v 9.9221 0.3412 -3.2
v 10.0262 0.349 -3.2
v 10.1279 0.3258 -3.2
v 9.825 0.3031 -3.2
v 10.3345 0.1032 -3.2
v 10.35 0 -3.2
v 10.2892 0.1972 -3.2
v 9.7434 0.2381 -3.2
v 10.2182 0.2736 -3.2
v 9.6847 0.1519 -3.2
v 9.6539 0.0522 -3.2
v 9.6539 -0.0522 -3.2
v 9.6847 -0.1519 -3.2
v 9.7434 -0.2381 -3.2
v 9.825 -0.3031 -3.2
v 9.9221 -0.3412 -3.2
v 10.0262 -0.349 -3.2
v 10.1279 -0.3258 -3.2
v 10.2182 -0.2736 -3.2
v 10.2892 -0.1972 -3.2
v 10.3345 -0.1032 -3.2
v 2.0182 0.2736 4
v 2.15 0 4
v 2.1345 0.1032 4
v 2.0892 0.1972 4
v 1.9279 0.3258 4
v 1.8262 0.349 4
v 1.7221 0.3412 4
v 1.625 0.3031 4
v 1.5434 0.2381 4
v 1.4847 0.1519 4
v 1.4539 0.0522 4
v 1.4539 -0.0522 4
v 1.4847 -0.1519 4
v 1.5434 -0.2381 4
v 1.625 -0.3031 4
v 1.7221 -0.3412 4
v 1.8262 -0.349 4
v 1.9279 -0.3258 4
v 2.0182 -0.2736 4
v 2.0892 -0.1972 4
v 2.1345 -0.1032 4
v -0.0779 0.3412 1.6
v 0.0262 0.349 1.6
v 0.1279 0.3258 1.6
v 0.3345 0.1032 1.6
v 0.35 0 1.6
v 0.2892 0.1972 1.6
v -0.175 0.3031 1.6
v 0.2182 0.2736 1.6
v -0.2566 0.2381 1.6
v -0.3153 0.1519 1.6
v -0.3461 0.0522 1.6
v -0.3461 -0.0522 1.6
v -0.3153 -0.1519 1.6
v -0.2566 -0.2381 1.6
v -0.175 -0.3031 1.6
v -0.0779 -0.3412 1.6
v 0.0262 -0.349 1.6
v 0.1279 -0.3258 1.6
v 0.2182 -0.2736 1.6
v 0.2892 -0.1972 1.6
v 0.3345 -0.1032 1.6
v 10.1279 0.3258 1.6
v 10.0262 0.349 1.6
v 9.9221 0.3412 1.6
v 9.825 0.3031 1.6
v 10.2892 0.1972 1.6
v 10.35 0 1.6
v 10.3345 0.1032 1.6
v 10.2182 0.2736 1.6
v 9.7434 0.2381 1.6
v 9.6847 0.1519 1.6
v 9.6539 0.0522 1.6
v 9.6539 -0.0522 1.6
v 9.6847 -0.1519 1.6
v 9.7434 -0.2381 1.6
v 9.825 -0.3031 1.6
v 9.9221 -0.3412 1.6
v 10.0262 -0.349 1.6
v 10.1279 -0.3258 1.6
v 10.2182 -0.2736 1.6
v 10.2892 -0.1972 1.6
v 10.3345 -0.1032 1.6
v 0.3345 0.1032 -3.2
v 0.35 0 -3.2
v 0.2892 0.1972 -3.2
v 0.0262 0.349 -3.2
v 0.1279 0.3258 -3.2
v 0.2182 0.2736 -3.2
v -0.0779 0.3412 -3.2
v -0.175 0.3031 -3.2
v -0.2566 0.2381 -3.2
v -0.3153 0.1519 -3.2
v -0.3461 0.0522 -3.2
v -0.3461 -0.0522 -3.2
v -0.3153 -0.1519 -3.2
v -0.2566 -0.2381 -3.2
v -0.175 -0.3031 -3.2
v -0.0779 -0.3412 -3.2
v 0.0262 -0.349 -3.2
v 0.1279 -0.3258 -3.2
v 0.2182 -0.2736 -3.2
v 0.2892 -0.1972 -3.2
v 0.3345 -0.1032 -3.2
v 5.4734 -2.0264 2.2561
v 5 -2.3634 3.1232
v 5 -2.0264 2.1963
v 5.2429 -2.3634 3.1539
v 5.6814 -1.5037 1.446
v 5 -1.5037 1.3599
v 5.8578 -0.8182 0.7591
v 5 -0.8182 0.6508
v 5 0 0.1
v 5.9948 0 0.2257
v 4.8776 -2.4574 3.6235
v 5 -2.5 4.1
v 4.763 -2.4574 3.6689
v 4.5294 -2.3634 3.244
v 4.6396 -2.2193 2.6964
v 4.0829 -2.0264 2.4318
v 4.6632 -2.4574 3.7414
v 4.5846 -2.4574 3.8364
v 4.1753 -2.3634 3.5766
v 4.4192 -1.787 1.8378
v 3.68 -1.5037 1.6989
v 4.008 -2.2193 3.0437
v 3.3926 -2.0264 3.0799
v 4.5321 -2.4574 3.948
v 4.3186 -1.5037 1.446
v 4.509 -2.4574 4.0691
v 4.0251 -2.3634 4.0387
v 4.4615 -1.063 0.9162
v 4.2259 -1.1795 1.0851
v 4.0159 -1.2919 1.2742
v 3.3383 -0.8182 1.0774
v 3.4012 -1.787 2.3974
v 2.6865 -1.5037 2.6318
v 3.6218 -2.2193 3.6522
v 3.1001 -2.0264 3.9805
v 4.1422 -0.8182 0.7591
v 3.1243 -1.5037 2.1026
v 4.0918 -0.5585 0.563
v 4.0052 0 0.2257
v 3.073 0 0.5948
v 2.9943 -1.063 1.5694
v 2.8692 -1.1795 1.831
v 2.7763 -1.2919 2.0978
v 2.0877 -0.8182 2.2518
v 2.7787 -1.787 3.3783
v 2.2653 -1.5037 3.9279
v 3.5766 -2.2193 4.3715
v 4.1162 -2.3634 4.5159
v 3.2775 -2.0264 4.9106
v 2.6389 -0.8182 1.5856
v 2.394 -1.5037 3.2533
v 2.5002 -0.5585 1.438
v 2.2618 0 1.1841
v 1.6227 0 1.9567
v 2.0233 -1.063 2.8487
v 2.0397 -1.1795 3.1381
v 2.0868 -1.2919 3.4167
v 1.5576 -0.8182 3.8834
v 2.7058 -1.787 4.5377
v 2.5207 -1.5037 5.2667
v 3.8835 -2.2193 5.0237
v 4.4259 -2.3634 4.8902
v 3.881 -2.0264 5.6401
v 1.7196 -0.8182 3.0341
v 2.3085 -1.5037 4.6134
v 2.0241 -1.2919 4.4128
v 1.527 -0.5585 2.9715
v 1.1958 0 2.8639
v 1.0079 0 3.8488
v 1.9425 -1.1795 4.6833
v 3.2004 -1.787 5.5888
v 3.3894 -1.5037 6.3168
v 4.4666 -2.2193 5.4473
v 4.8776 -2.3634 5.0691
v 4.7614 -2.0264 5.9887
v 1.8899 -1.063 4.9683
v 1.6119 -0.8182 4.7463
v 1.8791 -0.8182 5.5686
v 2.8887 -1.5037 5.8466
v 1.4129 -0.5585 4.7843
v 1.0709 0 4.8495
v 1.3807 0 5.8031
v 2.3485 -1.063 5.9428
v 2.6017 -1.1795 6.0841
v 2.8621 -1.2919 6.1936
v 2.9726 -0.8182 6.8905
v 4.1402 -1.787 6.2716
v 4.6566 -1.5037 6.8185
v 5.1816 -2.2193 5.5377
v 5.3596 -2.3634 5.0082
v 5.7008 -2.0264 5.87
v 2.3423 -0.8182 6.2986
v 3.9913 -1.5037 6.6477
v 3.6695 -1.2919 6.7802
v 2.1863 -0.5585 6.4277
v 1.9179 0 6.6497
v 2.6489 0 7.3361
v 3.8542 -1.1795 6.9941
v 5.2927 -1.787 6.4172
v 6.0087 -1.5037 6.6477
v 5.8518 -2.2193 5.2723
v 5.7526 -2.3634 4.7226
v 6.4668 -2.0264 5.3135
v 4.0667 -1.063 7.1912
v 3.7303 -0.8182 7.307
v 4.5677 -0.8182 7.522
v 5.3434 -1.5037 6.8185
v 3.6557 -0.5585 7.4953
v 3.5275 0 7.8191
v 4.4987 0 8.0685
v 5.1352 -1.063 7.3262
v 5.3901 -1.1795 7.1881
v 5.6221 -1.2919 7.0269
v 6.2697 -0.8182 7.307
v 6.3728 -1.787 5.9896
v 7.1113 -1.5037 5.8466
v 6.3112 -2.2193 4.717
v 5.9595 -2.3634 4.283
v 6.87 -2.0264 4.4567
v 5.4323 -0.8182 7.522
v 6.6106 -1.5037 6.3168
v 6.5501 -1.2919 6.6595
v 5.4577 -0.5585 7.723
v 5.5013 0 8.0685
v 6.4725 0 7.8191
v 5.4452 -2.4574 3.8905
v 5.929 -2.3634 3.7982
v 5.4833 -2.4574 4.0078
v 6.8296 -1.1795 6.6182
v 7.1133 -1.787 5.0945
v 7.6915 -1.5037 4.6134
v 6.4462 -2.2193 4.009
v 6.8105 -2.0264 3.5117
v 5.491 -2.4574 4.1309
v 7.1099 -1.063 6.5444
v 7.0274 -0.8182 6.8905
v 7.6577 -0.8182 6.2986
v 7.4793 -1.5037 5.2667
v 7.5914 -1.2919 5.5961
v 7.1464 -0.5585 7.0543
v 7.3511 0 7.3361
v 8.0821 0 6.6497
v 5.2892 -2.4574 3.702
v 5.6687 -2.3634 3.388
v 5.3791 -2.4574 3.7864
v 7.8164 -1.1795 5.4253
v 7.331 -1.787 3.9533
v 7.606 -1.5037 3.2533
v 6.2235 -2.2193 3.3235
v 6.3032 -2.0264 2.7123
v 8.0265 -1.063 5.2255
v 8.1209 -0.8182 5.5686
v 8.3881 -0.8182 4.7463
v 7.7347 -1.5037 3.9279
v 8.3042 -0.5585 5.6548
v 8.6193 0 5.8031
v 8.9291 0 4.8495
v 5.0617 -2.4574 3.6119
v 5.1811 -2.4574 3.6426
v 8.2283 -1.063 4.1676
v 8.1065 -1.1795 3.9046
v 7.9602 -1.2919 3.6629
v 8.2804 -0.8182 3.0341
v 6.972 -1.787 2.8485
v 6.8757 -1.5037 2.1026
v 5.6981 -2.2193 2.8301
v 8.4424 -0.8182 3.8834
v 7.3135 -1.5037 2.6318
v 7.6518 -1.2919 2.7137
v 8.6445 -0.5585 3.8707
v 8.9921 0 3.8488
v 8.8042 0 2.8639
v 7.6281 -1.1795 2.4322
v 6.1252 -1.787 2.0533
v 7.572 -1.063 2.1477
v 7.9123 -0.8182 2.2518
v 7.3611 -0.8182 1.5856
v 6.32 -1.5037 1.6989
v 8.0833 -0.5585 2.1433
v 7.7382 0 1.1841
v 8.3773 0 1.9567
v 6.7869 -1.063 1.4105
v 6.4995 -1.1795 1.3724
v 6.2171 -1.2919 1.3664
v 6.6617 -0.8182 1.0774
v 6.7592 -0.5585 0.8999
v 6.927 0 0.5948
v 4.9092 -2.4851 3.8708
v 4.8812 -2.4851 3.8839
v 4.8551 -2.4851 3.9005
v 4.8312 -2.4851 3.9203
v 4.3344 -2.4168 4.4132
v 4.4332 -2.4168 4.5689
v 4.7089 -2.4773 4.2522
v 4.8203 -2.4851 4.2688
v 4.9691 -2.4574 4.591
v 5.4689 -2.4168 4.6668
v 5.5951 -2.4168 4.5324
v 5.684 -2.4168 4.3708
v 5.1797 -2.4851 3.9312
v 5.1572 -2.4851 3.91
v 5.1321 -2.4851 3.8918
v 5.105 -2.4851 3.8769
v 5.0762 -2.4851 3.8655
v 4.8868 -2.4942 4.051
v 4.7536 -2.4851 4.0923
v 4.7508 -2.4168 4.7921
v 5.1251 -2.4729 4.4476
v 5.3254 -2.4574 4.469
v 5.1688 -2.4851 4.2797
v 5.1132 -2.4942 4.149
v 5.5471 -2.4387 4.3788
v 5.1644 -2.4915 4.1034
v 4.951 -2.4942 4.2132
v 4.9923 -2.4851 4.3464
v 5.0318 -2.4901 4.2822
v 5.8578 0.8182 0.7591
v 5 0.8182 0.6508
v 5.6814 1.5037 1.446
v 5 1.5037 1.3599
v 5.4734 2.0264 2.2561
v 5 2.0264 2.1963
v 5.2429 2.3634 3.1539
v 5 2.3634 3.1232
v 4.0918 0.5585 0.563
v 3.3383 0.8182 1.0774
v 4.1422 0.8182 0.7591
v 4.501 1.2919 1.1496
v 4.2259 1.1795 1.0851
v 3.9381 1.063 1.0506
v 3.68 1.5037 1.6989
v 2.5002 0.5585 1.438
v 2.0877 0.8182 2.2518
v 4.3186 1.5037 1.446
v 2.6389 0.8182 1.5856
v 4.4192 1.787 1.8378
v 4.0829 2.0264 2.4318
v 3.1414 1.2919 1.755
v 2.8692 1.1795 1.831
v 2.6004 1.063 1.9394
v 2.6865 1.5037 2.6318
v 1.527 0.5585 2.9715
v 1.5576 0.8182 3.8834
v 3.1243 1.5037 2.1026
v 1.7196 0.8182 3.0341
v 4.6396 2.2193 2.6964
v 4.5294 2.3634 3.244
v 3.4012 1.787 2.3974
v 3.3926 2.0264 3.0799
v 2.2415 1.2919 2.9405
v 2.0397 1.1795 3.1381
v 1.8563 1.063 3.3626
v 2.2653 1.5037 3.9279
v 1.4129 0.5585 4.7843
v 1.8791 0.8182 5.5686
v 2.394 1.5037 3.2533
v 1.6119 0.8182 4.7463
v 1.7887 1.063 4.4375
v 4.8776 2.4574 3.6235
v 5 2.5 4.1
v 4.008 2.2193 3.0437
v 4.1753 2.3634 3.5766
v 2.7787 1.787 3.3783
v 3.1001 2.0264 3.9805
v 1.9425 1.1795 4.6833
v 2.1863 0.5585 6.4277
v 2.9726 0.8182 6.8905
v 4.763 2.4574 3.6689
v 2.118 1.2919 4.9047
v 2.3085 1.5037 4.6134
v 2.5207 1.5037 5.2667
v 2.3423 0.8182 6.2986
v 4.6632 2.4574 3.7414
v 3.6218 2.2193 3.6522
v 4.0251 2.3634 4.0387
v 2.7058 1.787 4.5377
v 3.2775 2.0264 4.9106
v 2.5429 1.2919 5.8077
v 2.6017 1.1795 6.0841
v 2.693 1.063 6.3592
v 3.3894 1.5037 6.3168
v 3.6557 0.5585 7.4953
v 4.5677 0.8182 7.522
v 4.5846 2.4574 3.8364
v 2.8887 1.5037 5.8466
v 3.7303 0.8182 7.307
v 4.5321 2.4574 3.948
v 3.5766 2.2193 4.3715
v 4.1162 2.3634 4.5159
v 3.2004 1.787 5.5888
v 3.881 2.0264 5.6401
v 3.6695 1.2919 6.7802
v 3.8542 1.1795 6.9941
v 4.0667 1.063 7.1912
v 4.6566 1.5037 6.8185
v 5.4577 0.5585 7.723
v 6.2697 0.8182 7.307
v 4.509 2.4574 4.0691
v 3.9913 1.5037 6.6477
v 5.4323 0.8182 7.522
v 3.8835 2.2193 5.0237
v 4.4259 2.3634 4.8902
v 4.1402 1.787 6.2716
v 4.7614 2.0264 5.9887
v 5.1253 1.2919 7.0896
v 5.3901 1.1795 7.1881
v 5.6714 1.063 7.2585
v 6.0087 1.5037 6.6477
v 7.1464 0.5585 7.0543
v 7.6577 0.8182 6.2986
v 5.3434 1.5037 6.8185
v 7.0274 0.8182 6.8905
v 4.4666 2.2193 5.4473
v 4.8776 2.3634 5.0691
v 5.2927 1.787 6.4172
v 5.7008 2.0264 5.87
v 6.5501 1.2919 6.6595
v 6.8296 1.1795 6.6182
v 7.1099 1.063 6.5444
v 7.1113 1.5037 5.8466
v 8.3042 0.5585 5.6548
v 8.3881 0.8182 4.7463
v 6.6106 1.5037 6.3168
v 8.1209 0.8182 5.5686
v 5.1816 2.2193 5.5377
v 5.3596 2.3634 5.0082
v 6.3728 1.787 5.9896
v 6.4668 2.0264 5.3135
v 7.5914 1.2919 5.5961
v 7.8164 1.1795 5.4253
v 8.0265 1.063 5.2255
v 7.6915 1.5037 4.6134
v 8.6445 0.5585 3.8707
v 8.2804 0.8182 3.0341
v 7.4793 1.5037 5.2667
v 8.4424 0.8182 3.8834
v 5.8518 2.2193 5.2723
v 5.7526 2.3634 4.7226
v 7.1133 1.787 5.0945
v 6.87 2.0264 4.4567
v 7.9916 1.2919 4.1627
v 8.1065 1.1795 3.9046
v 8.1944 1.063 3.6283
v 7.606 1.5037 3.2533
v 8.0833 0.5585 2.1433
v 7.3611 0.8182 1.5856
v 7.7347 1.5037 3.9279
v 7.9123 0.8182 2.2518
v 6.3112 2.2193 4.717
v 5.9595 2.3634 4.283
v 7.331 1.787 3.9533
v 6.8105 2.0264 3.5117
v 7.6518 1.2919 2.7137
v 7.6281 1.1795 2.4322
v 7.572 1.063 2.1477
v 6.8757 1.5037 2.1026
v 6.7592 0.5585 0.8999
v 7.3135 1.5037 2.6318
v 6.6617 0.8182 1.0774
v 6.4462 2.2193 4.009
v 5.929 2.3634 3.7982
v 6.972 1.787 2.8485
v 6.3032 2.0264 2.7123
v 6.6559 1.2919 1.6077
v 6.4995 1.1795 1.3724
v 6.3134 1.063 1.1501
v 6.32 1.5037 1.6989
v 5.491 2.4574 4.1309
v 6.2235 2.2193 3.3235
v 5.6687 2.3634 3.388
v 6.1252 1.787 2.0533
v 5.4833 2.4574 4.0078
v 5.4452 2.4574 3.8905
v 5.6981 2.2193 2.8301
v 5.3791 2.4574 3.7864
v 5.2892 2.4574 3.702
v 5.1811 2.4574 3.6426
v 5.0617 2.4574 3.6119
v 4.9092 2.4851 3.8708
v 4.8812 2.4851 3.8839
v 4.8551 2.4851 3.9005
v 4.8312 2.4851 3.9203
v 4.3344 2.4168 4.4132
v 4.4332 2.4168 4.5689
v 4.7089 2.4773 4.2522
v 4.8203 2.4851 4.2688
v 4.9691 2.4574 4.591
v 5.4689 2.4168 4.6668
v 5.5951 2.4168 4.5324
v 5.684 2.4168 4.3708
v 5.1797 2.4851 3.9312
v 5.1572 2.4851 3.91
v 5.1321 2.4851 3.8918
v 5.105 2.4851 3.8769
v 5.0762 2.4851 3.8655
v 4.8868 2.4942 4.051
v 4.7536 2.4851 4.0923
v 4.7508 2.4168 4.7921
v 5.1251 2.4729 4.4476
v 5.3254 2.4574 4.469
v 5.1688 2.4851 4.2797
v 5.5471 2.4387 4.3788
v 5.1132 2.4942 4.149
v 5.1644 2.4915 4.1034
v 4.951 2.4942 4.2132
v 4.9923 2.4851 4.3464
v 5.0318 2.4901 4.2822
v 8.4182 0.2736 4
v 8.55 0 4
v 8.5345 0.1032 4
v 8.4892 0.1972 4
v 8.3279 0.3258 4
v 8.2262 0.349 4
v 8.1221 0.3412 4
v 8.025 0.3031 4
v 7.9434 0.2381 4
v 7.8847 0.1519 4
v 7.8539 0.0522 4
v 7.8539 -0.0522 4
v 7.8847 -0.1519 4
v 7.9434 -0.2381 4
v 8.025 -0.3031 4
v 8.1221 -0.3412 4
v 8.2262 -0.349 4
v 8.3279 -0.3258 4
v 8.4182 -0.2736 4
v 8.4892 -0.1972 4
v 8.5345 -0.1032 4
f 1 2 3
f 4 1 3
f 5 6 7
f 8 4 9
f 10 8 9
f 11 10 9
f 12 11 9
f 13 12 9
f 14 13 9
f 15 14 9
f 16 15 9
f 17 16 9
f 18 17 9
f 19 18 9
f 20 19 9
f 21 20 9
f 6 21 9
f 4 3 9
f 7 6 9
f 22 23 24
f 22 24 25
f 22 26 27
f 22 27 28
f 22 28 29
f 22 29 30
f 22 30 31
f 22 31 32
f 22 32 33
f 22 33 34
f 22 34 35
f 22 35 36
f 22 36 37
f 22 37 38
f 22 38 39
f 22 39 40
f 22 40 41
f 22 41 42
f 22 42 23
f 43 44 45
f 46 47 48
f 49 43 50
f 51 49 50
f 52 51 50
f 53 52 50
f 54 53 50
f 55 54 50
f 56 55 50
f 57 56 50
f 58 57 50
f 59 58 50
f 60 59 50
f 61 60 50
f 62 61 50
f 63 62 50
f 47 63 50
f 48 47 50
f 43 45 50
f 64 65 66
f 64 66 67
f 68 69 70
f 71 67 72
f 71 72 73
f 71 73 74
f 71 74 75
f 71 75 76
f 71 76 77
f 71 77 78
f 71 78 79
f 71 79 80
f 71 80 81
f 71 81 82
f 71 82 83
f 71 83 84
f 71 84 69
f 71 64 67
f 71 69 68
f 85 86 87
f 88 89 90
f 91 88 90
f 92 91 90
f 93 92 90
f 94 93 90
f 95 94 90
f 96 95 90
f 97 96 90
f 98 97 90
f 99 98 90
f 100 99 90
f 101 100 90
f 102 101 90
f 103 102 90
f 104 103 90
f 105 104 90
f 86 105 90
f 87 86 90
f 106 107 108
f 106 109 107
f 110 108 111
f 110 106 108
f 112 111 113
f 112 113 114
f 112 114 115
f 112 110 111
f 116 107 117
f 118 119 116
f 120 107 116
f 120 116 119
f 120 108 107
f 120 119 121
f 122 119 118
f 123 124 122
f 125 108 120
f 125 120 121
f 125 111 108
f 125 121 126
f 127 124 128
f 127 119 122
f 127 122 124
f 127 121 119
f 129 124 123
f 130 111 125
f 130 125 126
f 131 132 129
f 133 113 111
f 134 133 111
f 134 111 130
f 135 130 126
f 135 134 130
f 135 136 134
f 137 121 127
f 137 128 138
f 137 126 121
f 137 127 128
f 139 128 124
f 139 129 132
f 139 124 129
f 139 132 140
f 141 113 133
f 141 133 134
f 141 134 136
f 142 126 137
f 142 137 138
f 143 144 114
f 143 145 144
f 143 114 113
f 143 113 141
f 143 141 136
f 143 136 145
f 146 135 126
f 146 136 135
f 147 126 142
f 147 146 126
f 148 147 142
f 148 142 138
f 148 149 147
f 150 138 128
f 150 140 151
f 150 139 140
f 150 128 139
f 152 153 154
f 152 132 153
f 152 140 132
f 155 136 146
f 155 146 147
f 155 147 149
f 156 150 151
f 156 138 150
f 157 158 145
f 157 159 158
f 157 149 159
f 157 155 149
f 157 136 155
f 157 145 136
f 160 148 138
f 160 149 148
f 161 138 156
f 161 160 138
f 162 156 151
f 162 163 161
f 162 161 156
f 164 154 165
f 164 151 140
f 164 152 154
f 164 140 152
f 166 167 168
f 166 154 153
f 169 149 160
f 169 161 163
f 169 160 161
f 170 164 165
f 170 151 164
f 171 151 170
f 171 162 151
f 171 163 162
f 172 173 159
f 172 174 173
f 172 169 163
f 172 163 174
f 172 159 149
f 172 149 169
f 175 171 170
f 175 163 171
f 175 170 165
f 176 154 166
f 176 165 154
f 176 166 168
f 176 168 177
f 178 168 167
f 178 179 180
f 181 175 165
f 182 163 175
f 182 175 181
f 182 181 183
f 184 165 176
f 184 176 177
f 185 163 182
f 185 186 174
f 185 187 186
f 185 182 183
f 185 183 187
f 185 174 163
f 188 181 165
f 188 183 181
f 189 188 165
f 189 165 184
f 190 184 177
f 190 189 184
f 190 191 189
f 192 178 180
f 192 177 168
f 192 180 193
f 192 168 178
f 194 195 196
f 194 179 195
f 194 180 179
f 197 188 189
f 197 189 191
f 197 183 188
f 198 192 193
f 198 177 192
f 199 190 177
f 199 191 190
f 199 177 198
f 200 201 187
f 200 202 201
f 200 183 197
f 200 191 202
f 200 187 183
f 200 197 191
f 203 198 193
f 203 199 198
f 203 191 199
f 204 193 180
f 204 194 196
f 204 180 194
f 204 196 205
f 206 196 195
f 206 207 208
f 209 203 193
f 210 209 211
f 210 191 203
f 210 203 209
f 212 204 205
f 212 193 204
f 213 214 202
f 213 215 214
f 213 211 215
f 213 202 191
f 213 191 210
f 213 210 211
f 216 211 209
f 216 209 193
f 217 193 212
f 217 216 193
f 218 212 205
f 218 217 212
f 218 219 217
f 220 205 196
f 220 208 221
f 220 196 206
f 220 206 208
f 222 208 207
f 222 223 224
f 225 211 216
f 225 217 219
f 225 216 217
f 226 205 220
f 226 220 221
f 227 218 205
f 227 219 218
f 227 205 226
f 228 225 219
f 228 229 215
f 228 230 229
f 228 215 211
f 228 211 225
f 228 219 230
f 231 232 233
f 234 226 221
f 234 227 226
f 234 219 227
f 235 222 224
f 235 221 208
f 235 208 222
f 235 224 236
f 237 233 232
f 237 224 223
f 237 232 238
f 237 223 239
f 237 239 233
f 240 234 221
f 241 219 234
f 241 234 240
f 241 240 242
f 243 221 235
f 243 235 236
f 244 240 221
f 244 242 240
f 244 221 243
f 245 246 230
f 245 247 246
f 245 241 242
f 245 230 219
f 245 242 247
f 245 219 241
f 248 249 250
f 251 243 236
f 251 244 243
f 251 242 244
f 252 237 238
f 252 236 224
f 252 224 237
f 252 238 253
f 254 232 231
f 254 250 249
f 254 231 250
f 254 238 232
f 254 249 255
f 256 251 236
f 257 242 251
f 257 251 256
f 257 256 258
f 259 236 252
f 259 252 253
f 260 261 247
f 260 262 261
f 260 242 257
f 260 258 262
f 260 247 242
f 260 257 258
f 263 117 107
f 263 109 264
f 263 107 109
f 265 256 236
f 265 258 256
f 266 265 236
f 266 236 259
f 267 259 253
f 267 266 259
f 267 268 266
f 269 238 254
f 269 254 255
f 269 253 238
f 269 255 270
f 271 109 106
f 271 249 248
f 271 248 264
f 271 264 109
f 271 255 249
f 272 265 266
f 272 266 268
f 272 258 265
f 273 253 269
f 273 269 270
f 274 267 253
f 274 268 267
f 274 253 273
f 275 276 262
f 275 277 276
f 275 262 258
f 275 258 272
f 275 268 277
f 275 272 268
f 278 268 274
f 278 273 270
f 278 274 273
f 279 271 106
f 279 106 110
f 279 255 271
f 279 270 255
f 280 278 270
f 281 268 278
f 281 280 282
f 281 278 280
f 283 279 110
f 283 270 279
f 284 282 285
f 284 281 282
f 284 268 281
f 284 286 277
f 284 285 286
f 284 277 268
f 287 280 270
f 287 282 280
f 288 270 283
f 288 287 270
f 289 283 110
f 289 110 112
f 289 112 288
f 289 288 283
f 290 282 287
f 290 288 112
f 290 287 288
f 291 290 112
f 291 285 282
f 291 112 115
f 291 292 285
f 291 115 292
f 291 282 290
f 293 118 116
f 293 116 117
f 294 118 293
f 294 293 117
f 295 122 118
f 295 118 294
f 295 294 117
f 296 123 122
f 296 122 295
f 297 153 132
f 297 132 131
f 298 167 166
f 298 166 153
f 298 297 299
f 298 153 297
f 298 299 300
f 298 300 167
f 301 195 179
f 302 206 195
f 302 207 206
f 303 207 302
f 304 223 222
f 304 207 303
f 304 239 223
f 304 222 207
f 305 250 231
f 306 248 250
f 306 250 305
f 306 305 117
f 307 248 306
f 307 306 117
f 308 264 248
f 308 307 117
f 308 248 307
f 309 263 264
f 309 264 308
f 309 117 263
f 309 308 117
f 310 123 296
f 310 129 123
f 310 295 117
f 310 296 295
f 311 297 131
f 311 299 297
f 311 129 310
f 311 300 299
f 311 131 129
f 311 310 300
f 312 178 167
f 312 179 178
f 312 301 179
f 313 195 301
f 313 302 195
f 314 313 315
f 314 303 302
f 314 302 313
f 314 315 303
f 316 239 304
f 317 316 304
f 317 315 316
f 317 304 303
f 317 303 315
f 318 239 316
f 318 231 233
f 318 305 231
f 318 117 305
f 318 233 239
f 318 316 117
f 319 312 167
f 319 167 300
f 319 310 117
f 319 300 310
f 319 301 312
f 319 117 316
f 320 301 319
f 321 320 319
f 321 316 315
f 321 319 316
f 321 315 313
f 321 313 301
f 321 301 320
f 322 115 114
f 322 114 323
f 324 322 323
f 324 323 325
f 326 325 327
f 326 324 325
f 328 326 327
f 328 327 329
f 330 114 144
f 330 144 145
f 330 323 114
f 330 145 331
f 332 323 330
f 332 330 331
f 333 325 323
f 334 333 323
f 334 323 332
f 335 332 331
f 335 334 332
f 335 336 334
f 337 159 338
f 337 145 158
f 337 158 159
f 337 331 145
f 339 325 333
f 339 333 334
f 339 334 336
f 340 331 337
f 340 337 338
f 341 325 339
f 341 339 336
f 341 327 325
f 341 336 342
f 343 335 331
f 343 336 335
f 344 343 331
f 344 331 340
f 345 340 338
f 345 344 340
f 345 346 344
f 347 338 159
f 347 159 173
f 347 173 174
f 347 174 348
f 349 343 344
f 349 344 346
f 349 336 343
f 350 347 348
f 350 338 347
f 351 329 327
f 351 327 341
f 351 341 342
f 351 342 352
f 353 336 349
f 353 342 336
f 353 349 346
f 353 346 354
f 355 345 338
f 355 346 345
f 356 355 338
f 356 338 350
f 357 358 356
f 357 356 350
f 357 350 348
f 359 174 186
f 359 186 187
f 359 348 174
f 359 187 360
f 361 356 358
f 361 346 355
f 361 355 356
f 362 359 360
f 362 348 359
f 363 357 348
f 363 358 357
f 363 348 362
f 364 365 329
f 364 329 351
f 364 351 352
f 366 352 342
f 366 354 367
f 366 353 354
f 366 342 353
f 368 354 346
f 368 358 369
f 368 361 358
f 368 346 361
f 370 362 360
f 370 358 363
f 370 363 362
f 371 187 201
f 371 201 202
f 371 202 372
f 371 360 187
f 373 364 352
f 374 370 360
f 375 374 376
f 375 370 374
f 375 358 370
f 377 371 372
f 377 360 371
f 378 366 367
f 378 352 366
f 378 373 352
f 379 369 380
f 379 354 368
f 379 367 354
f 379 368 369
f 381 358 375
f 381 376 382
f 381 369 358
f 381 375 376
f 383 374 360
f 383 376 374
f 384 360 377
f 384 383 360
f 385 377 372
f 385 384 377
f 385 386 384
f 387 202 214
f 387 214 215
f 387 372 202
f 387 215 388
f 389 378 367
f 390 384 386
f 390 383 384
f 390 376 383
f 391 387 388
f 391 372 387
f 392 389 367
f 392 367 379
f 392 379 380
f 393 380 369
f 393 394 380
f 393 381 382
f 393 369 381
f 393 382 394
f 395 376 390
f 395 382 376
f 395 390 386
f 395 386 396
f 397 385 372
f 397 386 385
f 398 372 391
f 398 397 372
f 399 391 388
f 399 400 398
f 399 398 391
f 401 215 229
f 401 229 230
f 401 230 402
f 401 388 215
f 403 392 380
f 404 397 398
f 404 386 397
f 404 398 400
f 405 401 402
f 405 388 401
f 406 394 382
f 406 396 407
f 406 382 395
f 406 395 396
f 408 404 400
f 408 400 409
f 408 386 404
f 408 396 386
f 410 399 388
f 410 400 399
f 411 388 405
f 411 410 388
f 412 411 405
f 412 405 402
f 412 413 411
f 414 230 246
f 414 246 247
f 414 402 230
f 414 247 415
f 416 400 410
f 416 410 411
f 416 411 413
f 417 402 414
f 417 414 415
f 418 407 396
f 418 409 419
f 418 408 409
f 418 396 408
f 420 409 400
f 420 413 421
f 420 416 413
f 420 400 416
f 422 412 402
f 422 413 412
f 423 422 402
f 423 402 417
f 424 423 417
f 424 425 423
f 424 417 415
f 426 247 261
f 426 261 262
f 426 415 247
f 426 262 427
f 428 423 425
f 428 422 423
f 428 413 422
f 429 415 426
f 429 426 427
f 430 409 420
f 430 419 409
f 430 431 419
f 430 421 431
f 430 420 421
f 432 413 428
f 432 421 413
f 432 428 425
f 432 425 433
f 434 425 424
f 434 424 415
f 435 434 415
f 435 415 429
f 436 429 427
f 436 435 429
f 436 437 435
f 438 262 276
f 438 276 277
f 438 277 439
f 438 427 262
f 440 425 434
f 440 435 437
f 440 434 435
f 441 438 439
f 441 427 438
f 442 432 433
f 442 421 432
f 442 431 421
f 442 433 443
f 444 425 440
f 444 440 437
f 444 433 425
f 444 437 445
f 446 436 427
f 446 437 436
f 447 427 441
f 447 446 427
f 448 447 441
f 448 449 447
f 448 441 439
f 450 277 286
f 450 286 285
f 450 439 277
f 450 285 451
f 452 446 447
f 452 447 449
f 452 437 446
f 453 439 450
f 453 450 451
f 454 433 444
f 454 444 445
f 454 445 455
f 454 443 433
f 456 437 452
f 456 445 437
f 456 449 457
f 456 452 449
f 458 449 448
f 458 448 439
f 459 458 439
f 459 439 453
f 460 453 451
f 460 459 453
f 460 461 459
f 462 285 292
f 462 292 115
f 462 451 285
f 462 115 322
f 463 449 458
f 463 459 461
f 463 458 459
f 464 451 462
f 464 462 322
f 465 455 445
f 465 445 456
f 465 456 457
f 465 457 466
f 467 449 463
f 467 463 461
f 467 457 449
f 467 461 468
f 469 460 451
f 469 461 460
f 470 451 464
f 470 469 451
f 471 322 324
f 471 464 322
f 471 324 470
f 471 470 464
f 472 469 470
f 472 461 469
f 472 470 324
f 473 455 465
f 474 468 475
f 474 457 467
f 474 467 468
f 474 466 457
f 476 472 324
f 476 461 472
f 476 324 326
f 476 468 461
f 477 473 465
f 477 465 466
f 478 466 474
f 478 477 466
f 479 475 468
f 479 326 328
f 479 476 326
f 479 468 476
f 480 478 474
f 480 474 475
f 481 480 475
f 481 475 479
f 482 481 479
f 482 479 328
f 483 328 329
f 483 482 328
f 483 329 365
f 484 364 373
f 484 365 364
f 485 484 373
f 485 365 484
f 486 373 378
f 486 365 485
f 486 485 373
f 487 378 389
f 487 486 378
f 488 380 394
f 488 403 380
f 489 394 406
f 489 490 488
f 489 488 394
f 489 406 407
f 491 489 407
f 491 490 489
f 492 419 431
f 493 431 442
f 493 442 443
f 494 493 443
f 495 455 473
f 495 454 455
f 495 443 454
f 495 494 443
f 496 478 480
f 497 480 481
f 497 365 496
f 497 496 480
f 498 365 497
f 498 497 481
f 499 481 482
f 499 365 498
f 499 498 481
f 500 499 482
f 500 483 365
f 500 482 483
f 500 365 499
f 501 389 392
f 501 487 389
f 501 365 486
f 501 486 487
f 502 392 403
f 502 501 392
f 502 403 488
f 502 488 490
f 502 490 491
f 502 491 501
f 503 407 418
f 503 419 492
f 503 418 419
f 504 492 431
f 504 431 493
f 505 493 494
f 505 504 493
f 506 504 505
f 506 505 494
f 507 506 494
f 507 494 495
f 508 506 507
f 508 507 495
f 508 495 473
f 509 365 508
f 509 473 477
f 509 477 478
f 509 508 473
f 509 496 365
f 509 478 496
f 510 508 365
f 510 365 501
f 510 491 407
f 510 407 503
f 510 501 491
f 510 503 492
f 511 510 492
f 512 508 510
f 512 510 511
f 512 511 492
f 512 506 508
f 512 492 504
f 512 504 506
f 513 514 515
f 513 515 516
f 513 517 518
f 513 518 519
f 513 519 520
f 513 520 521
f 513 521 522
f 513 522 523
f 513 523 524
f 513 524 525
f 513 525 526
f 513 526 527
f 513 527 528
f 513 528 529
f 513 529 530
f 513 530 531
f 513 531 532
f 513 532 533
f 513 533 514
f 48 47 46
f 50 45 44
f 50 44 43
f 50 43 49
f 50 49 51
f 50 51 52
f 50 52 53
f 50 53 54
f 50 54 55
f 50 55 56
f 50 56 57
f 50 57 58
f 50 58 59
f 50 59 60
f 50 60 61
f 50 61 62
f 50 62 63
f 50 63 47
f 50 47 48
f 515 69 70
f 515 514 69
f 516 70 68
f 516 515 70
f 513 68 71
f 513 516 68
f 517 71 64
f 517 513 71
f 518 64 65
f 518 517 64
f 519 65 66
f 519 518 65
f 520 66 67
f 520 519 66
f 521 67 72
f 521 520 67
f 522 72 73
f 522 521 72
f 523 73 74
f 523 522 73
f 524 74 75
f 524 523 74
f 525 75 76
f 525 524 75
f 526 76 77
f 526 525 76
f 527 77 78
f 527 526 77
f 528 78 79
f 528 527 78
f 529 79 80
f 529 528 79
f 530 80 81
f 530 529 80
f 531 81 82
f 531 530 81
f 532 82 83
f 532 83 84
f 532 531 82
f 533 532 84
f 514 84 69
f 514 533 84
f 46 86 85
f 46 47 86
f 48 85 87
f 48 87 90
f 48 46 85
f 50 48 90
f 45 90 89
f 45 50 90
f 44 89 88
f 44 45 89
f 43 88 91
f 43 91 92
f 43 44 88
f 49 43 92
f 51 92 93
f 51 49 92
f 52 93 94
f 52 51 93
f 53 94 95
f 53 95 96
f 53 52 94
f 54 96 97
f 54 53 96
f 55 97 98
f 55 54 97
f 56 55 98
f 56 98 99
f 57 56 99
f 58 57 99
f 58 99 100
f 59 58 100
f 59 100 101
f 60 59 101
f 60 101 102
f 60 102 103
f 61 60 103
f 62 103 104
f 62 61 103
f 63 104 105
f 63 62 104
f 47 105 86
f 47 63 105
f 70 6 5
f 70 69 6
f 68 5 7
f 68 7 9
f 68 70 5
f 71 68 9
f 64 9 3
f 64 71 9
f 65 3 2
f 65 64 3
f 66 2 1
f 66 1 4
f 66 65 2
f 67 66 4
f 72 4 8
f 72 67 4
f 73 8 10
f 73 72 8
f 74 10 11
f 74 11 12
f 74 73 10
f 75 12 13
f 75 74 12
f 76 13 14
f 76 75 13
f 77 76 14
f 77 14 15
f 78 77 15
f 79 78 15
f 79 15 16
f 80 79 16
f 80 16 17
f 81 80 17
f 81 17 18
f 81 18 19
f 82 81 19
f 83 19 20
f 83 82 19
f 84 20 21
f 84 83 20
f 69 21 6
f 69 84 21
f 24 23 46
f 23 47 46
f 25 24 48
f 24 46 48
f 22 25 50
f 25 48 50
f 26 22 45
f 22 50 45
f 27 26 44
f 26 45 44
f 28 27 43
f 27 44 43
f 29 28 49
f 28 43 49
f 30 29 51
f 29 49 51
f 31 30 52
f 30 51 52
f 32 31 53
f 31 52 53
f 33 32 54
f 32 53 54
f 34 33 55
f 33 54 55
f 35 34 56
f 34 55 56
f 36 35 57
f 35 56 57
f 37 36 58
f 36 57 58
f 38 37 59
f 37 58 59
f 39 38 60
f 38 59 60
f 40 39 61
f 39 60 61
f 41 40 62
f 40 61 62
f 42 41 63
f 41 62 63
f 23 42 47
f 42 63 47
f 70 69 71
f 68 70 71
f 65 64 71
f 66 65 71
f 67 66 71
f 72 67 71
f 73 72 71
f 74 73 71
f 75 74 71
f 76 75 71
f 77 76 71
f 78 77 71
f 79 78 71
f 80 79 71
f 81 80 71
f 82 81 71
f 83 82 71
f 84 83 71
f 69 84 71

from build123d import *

# Parameters (mm, degrees)
SKETCH001_R       = 0.35
PAD001_DEPTH      = 1.6
PAD001_DEPTH_BACK = 3.2
SKETCH002_R       = 0.35
SKETCH003_R       = 0.35
SKETCH004_R       = 0.35
SKETCH005_R       = 0.35


with BuildPart() as pad001:
    # Sketch001 → Pad001 (new body, two sides)
    with BuildSketch(Plane.XY) as pad001_sk:
        Circle(SKETCH001_R)
        with Locations((10, 0)):
            Circle(SKETCH001_R)
    extrude(amount=PAD001_DEPTH)
    extrude(pad001_sk.sketch, amount=-PAD001_DEPTH_BACK)


with BuildPart() as revolution:
    # Sketch → Revolution (revolve)
    with BuildSketch(Plane.YZ.offset(5)):
        with BuildLine():
            Line((-2.5, 4.1), (2.5, 4.1))
            ThreePointArc((0, 0.1), (1.786986, 1.764384), (2.5, 4.1))
            ThreePointArc((-2.5, 4.1), (-1.786986, 1.764384), (0, 0.1))
        make_face()
    revolve(axis=Axis((5, -3.32079, 4.1), (0, 1, 0)))


with BuildPart() as loft_body:
    # Sketch002 → Loft section 0
    with BuildSketch(Plane.XY.offset(4)):
        with Locations((1.8, 0)):
            Circle(SKETCH002_R)
    # Sketch003 → Loft section 1
    with BuildSketch(Plane.XY.offset(1.6)):
        Circle(SKETCH003_R)
    loft()


with BuildPart() as loft001:
    # Sketch004 → Loft001 section 0
    with BuildSketch(Plane.XY.offset(1.6)):
        with Locations((10, 0)):
            Circle(SKETCH004_R)
    # Sketch005 → Loft001 section 1
    with BuildSketch(Plane.XY.offset(4)):
        with Locations((8.2, 0)):
            Circle(SKETCH005_R)
    loft()


solid = Compound([pad001.part, revolution.part, loft_body.part, loft001.part])
